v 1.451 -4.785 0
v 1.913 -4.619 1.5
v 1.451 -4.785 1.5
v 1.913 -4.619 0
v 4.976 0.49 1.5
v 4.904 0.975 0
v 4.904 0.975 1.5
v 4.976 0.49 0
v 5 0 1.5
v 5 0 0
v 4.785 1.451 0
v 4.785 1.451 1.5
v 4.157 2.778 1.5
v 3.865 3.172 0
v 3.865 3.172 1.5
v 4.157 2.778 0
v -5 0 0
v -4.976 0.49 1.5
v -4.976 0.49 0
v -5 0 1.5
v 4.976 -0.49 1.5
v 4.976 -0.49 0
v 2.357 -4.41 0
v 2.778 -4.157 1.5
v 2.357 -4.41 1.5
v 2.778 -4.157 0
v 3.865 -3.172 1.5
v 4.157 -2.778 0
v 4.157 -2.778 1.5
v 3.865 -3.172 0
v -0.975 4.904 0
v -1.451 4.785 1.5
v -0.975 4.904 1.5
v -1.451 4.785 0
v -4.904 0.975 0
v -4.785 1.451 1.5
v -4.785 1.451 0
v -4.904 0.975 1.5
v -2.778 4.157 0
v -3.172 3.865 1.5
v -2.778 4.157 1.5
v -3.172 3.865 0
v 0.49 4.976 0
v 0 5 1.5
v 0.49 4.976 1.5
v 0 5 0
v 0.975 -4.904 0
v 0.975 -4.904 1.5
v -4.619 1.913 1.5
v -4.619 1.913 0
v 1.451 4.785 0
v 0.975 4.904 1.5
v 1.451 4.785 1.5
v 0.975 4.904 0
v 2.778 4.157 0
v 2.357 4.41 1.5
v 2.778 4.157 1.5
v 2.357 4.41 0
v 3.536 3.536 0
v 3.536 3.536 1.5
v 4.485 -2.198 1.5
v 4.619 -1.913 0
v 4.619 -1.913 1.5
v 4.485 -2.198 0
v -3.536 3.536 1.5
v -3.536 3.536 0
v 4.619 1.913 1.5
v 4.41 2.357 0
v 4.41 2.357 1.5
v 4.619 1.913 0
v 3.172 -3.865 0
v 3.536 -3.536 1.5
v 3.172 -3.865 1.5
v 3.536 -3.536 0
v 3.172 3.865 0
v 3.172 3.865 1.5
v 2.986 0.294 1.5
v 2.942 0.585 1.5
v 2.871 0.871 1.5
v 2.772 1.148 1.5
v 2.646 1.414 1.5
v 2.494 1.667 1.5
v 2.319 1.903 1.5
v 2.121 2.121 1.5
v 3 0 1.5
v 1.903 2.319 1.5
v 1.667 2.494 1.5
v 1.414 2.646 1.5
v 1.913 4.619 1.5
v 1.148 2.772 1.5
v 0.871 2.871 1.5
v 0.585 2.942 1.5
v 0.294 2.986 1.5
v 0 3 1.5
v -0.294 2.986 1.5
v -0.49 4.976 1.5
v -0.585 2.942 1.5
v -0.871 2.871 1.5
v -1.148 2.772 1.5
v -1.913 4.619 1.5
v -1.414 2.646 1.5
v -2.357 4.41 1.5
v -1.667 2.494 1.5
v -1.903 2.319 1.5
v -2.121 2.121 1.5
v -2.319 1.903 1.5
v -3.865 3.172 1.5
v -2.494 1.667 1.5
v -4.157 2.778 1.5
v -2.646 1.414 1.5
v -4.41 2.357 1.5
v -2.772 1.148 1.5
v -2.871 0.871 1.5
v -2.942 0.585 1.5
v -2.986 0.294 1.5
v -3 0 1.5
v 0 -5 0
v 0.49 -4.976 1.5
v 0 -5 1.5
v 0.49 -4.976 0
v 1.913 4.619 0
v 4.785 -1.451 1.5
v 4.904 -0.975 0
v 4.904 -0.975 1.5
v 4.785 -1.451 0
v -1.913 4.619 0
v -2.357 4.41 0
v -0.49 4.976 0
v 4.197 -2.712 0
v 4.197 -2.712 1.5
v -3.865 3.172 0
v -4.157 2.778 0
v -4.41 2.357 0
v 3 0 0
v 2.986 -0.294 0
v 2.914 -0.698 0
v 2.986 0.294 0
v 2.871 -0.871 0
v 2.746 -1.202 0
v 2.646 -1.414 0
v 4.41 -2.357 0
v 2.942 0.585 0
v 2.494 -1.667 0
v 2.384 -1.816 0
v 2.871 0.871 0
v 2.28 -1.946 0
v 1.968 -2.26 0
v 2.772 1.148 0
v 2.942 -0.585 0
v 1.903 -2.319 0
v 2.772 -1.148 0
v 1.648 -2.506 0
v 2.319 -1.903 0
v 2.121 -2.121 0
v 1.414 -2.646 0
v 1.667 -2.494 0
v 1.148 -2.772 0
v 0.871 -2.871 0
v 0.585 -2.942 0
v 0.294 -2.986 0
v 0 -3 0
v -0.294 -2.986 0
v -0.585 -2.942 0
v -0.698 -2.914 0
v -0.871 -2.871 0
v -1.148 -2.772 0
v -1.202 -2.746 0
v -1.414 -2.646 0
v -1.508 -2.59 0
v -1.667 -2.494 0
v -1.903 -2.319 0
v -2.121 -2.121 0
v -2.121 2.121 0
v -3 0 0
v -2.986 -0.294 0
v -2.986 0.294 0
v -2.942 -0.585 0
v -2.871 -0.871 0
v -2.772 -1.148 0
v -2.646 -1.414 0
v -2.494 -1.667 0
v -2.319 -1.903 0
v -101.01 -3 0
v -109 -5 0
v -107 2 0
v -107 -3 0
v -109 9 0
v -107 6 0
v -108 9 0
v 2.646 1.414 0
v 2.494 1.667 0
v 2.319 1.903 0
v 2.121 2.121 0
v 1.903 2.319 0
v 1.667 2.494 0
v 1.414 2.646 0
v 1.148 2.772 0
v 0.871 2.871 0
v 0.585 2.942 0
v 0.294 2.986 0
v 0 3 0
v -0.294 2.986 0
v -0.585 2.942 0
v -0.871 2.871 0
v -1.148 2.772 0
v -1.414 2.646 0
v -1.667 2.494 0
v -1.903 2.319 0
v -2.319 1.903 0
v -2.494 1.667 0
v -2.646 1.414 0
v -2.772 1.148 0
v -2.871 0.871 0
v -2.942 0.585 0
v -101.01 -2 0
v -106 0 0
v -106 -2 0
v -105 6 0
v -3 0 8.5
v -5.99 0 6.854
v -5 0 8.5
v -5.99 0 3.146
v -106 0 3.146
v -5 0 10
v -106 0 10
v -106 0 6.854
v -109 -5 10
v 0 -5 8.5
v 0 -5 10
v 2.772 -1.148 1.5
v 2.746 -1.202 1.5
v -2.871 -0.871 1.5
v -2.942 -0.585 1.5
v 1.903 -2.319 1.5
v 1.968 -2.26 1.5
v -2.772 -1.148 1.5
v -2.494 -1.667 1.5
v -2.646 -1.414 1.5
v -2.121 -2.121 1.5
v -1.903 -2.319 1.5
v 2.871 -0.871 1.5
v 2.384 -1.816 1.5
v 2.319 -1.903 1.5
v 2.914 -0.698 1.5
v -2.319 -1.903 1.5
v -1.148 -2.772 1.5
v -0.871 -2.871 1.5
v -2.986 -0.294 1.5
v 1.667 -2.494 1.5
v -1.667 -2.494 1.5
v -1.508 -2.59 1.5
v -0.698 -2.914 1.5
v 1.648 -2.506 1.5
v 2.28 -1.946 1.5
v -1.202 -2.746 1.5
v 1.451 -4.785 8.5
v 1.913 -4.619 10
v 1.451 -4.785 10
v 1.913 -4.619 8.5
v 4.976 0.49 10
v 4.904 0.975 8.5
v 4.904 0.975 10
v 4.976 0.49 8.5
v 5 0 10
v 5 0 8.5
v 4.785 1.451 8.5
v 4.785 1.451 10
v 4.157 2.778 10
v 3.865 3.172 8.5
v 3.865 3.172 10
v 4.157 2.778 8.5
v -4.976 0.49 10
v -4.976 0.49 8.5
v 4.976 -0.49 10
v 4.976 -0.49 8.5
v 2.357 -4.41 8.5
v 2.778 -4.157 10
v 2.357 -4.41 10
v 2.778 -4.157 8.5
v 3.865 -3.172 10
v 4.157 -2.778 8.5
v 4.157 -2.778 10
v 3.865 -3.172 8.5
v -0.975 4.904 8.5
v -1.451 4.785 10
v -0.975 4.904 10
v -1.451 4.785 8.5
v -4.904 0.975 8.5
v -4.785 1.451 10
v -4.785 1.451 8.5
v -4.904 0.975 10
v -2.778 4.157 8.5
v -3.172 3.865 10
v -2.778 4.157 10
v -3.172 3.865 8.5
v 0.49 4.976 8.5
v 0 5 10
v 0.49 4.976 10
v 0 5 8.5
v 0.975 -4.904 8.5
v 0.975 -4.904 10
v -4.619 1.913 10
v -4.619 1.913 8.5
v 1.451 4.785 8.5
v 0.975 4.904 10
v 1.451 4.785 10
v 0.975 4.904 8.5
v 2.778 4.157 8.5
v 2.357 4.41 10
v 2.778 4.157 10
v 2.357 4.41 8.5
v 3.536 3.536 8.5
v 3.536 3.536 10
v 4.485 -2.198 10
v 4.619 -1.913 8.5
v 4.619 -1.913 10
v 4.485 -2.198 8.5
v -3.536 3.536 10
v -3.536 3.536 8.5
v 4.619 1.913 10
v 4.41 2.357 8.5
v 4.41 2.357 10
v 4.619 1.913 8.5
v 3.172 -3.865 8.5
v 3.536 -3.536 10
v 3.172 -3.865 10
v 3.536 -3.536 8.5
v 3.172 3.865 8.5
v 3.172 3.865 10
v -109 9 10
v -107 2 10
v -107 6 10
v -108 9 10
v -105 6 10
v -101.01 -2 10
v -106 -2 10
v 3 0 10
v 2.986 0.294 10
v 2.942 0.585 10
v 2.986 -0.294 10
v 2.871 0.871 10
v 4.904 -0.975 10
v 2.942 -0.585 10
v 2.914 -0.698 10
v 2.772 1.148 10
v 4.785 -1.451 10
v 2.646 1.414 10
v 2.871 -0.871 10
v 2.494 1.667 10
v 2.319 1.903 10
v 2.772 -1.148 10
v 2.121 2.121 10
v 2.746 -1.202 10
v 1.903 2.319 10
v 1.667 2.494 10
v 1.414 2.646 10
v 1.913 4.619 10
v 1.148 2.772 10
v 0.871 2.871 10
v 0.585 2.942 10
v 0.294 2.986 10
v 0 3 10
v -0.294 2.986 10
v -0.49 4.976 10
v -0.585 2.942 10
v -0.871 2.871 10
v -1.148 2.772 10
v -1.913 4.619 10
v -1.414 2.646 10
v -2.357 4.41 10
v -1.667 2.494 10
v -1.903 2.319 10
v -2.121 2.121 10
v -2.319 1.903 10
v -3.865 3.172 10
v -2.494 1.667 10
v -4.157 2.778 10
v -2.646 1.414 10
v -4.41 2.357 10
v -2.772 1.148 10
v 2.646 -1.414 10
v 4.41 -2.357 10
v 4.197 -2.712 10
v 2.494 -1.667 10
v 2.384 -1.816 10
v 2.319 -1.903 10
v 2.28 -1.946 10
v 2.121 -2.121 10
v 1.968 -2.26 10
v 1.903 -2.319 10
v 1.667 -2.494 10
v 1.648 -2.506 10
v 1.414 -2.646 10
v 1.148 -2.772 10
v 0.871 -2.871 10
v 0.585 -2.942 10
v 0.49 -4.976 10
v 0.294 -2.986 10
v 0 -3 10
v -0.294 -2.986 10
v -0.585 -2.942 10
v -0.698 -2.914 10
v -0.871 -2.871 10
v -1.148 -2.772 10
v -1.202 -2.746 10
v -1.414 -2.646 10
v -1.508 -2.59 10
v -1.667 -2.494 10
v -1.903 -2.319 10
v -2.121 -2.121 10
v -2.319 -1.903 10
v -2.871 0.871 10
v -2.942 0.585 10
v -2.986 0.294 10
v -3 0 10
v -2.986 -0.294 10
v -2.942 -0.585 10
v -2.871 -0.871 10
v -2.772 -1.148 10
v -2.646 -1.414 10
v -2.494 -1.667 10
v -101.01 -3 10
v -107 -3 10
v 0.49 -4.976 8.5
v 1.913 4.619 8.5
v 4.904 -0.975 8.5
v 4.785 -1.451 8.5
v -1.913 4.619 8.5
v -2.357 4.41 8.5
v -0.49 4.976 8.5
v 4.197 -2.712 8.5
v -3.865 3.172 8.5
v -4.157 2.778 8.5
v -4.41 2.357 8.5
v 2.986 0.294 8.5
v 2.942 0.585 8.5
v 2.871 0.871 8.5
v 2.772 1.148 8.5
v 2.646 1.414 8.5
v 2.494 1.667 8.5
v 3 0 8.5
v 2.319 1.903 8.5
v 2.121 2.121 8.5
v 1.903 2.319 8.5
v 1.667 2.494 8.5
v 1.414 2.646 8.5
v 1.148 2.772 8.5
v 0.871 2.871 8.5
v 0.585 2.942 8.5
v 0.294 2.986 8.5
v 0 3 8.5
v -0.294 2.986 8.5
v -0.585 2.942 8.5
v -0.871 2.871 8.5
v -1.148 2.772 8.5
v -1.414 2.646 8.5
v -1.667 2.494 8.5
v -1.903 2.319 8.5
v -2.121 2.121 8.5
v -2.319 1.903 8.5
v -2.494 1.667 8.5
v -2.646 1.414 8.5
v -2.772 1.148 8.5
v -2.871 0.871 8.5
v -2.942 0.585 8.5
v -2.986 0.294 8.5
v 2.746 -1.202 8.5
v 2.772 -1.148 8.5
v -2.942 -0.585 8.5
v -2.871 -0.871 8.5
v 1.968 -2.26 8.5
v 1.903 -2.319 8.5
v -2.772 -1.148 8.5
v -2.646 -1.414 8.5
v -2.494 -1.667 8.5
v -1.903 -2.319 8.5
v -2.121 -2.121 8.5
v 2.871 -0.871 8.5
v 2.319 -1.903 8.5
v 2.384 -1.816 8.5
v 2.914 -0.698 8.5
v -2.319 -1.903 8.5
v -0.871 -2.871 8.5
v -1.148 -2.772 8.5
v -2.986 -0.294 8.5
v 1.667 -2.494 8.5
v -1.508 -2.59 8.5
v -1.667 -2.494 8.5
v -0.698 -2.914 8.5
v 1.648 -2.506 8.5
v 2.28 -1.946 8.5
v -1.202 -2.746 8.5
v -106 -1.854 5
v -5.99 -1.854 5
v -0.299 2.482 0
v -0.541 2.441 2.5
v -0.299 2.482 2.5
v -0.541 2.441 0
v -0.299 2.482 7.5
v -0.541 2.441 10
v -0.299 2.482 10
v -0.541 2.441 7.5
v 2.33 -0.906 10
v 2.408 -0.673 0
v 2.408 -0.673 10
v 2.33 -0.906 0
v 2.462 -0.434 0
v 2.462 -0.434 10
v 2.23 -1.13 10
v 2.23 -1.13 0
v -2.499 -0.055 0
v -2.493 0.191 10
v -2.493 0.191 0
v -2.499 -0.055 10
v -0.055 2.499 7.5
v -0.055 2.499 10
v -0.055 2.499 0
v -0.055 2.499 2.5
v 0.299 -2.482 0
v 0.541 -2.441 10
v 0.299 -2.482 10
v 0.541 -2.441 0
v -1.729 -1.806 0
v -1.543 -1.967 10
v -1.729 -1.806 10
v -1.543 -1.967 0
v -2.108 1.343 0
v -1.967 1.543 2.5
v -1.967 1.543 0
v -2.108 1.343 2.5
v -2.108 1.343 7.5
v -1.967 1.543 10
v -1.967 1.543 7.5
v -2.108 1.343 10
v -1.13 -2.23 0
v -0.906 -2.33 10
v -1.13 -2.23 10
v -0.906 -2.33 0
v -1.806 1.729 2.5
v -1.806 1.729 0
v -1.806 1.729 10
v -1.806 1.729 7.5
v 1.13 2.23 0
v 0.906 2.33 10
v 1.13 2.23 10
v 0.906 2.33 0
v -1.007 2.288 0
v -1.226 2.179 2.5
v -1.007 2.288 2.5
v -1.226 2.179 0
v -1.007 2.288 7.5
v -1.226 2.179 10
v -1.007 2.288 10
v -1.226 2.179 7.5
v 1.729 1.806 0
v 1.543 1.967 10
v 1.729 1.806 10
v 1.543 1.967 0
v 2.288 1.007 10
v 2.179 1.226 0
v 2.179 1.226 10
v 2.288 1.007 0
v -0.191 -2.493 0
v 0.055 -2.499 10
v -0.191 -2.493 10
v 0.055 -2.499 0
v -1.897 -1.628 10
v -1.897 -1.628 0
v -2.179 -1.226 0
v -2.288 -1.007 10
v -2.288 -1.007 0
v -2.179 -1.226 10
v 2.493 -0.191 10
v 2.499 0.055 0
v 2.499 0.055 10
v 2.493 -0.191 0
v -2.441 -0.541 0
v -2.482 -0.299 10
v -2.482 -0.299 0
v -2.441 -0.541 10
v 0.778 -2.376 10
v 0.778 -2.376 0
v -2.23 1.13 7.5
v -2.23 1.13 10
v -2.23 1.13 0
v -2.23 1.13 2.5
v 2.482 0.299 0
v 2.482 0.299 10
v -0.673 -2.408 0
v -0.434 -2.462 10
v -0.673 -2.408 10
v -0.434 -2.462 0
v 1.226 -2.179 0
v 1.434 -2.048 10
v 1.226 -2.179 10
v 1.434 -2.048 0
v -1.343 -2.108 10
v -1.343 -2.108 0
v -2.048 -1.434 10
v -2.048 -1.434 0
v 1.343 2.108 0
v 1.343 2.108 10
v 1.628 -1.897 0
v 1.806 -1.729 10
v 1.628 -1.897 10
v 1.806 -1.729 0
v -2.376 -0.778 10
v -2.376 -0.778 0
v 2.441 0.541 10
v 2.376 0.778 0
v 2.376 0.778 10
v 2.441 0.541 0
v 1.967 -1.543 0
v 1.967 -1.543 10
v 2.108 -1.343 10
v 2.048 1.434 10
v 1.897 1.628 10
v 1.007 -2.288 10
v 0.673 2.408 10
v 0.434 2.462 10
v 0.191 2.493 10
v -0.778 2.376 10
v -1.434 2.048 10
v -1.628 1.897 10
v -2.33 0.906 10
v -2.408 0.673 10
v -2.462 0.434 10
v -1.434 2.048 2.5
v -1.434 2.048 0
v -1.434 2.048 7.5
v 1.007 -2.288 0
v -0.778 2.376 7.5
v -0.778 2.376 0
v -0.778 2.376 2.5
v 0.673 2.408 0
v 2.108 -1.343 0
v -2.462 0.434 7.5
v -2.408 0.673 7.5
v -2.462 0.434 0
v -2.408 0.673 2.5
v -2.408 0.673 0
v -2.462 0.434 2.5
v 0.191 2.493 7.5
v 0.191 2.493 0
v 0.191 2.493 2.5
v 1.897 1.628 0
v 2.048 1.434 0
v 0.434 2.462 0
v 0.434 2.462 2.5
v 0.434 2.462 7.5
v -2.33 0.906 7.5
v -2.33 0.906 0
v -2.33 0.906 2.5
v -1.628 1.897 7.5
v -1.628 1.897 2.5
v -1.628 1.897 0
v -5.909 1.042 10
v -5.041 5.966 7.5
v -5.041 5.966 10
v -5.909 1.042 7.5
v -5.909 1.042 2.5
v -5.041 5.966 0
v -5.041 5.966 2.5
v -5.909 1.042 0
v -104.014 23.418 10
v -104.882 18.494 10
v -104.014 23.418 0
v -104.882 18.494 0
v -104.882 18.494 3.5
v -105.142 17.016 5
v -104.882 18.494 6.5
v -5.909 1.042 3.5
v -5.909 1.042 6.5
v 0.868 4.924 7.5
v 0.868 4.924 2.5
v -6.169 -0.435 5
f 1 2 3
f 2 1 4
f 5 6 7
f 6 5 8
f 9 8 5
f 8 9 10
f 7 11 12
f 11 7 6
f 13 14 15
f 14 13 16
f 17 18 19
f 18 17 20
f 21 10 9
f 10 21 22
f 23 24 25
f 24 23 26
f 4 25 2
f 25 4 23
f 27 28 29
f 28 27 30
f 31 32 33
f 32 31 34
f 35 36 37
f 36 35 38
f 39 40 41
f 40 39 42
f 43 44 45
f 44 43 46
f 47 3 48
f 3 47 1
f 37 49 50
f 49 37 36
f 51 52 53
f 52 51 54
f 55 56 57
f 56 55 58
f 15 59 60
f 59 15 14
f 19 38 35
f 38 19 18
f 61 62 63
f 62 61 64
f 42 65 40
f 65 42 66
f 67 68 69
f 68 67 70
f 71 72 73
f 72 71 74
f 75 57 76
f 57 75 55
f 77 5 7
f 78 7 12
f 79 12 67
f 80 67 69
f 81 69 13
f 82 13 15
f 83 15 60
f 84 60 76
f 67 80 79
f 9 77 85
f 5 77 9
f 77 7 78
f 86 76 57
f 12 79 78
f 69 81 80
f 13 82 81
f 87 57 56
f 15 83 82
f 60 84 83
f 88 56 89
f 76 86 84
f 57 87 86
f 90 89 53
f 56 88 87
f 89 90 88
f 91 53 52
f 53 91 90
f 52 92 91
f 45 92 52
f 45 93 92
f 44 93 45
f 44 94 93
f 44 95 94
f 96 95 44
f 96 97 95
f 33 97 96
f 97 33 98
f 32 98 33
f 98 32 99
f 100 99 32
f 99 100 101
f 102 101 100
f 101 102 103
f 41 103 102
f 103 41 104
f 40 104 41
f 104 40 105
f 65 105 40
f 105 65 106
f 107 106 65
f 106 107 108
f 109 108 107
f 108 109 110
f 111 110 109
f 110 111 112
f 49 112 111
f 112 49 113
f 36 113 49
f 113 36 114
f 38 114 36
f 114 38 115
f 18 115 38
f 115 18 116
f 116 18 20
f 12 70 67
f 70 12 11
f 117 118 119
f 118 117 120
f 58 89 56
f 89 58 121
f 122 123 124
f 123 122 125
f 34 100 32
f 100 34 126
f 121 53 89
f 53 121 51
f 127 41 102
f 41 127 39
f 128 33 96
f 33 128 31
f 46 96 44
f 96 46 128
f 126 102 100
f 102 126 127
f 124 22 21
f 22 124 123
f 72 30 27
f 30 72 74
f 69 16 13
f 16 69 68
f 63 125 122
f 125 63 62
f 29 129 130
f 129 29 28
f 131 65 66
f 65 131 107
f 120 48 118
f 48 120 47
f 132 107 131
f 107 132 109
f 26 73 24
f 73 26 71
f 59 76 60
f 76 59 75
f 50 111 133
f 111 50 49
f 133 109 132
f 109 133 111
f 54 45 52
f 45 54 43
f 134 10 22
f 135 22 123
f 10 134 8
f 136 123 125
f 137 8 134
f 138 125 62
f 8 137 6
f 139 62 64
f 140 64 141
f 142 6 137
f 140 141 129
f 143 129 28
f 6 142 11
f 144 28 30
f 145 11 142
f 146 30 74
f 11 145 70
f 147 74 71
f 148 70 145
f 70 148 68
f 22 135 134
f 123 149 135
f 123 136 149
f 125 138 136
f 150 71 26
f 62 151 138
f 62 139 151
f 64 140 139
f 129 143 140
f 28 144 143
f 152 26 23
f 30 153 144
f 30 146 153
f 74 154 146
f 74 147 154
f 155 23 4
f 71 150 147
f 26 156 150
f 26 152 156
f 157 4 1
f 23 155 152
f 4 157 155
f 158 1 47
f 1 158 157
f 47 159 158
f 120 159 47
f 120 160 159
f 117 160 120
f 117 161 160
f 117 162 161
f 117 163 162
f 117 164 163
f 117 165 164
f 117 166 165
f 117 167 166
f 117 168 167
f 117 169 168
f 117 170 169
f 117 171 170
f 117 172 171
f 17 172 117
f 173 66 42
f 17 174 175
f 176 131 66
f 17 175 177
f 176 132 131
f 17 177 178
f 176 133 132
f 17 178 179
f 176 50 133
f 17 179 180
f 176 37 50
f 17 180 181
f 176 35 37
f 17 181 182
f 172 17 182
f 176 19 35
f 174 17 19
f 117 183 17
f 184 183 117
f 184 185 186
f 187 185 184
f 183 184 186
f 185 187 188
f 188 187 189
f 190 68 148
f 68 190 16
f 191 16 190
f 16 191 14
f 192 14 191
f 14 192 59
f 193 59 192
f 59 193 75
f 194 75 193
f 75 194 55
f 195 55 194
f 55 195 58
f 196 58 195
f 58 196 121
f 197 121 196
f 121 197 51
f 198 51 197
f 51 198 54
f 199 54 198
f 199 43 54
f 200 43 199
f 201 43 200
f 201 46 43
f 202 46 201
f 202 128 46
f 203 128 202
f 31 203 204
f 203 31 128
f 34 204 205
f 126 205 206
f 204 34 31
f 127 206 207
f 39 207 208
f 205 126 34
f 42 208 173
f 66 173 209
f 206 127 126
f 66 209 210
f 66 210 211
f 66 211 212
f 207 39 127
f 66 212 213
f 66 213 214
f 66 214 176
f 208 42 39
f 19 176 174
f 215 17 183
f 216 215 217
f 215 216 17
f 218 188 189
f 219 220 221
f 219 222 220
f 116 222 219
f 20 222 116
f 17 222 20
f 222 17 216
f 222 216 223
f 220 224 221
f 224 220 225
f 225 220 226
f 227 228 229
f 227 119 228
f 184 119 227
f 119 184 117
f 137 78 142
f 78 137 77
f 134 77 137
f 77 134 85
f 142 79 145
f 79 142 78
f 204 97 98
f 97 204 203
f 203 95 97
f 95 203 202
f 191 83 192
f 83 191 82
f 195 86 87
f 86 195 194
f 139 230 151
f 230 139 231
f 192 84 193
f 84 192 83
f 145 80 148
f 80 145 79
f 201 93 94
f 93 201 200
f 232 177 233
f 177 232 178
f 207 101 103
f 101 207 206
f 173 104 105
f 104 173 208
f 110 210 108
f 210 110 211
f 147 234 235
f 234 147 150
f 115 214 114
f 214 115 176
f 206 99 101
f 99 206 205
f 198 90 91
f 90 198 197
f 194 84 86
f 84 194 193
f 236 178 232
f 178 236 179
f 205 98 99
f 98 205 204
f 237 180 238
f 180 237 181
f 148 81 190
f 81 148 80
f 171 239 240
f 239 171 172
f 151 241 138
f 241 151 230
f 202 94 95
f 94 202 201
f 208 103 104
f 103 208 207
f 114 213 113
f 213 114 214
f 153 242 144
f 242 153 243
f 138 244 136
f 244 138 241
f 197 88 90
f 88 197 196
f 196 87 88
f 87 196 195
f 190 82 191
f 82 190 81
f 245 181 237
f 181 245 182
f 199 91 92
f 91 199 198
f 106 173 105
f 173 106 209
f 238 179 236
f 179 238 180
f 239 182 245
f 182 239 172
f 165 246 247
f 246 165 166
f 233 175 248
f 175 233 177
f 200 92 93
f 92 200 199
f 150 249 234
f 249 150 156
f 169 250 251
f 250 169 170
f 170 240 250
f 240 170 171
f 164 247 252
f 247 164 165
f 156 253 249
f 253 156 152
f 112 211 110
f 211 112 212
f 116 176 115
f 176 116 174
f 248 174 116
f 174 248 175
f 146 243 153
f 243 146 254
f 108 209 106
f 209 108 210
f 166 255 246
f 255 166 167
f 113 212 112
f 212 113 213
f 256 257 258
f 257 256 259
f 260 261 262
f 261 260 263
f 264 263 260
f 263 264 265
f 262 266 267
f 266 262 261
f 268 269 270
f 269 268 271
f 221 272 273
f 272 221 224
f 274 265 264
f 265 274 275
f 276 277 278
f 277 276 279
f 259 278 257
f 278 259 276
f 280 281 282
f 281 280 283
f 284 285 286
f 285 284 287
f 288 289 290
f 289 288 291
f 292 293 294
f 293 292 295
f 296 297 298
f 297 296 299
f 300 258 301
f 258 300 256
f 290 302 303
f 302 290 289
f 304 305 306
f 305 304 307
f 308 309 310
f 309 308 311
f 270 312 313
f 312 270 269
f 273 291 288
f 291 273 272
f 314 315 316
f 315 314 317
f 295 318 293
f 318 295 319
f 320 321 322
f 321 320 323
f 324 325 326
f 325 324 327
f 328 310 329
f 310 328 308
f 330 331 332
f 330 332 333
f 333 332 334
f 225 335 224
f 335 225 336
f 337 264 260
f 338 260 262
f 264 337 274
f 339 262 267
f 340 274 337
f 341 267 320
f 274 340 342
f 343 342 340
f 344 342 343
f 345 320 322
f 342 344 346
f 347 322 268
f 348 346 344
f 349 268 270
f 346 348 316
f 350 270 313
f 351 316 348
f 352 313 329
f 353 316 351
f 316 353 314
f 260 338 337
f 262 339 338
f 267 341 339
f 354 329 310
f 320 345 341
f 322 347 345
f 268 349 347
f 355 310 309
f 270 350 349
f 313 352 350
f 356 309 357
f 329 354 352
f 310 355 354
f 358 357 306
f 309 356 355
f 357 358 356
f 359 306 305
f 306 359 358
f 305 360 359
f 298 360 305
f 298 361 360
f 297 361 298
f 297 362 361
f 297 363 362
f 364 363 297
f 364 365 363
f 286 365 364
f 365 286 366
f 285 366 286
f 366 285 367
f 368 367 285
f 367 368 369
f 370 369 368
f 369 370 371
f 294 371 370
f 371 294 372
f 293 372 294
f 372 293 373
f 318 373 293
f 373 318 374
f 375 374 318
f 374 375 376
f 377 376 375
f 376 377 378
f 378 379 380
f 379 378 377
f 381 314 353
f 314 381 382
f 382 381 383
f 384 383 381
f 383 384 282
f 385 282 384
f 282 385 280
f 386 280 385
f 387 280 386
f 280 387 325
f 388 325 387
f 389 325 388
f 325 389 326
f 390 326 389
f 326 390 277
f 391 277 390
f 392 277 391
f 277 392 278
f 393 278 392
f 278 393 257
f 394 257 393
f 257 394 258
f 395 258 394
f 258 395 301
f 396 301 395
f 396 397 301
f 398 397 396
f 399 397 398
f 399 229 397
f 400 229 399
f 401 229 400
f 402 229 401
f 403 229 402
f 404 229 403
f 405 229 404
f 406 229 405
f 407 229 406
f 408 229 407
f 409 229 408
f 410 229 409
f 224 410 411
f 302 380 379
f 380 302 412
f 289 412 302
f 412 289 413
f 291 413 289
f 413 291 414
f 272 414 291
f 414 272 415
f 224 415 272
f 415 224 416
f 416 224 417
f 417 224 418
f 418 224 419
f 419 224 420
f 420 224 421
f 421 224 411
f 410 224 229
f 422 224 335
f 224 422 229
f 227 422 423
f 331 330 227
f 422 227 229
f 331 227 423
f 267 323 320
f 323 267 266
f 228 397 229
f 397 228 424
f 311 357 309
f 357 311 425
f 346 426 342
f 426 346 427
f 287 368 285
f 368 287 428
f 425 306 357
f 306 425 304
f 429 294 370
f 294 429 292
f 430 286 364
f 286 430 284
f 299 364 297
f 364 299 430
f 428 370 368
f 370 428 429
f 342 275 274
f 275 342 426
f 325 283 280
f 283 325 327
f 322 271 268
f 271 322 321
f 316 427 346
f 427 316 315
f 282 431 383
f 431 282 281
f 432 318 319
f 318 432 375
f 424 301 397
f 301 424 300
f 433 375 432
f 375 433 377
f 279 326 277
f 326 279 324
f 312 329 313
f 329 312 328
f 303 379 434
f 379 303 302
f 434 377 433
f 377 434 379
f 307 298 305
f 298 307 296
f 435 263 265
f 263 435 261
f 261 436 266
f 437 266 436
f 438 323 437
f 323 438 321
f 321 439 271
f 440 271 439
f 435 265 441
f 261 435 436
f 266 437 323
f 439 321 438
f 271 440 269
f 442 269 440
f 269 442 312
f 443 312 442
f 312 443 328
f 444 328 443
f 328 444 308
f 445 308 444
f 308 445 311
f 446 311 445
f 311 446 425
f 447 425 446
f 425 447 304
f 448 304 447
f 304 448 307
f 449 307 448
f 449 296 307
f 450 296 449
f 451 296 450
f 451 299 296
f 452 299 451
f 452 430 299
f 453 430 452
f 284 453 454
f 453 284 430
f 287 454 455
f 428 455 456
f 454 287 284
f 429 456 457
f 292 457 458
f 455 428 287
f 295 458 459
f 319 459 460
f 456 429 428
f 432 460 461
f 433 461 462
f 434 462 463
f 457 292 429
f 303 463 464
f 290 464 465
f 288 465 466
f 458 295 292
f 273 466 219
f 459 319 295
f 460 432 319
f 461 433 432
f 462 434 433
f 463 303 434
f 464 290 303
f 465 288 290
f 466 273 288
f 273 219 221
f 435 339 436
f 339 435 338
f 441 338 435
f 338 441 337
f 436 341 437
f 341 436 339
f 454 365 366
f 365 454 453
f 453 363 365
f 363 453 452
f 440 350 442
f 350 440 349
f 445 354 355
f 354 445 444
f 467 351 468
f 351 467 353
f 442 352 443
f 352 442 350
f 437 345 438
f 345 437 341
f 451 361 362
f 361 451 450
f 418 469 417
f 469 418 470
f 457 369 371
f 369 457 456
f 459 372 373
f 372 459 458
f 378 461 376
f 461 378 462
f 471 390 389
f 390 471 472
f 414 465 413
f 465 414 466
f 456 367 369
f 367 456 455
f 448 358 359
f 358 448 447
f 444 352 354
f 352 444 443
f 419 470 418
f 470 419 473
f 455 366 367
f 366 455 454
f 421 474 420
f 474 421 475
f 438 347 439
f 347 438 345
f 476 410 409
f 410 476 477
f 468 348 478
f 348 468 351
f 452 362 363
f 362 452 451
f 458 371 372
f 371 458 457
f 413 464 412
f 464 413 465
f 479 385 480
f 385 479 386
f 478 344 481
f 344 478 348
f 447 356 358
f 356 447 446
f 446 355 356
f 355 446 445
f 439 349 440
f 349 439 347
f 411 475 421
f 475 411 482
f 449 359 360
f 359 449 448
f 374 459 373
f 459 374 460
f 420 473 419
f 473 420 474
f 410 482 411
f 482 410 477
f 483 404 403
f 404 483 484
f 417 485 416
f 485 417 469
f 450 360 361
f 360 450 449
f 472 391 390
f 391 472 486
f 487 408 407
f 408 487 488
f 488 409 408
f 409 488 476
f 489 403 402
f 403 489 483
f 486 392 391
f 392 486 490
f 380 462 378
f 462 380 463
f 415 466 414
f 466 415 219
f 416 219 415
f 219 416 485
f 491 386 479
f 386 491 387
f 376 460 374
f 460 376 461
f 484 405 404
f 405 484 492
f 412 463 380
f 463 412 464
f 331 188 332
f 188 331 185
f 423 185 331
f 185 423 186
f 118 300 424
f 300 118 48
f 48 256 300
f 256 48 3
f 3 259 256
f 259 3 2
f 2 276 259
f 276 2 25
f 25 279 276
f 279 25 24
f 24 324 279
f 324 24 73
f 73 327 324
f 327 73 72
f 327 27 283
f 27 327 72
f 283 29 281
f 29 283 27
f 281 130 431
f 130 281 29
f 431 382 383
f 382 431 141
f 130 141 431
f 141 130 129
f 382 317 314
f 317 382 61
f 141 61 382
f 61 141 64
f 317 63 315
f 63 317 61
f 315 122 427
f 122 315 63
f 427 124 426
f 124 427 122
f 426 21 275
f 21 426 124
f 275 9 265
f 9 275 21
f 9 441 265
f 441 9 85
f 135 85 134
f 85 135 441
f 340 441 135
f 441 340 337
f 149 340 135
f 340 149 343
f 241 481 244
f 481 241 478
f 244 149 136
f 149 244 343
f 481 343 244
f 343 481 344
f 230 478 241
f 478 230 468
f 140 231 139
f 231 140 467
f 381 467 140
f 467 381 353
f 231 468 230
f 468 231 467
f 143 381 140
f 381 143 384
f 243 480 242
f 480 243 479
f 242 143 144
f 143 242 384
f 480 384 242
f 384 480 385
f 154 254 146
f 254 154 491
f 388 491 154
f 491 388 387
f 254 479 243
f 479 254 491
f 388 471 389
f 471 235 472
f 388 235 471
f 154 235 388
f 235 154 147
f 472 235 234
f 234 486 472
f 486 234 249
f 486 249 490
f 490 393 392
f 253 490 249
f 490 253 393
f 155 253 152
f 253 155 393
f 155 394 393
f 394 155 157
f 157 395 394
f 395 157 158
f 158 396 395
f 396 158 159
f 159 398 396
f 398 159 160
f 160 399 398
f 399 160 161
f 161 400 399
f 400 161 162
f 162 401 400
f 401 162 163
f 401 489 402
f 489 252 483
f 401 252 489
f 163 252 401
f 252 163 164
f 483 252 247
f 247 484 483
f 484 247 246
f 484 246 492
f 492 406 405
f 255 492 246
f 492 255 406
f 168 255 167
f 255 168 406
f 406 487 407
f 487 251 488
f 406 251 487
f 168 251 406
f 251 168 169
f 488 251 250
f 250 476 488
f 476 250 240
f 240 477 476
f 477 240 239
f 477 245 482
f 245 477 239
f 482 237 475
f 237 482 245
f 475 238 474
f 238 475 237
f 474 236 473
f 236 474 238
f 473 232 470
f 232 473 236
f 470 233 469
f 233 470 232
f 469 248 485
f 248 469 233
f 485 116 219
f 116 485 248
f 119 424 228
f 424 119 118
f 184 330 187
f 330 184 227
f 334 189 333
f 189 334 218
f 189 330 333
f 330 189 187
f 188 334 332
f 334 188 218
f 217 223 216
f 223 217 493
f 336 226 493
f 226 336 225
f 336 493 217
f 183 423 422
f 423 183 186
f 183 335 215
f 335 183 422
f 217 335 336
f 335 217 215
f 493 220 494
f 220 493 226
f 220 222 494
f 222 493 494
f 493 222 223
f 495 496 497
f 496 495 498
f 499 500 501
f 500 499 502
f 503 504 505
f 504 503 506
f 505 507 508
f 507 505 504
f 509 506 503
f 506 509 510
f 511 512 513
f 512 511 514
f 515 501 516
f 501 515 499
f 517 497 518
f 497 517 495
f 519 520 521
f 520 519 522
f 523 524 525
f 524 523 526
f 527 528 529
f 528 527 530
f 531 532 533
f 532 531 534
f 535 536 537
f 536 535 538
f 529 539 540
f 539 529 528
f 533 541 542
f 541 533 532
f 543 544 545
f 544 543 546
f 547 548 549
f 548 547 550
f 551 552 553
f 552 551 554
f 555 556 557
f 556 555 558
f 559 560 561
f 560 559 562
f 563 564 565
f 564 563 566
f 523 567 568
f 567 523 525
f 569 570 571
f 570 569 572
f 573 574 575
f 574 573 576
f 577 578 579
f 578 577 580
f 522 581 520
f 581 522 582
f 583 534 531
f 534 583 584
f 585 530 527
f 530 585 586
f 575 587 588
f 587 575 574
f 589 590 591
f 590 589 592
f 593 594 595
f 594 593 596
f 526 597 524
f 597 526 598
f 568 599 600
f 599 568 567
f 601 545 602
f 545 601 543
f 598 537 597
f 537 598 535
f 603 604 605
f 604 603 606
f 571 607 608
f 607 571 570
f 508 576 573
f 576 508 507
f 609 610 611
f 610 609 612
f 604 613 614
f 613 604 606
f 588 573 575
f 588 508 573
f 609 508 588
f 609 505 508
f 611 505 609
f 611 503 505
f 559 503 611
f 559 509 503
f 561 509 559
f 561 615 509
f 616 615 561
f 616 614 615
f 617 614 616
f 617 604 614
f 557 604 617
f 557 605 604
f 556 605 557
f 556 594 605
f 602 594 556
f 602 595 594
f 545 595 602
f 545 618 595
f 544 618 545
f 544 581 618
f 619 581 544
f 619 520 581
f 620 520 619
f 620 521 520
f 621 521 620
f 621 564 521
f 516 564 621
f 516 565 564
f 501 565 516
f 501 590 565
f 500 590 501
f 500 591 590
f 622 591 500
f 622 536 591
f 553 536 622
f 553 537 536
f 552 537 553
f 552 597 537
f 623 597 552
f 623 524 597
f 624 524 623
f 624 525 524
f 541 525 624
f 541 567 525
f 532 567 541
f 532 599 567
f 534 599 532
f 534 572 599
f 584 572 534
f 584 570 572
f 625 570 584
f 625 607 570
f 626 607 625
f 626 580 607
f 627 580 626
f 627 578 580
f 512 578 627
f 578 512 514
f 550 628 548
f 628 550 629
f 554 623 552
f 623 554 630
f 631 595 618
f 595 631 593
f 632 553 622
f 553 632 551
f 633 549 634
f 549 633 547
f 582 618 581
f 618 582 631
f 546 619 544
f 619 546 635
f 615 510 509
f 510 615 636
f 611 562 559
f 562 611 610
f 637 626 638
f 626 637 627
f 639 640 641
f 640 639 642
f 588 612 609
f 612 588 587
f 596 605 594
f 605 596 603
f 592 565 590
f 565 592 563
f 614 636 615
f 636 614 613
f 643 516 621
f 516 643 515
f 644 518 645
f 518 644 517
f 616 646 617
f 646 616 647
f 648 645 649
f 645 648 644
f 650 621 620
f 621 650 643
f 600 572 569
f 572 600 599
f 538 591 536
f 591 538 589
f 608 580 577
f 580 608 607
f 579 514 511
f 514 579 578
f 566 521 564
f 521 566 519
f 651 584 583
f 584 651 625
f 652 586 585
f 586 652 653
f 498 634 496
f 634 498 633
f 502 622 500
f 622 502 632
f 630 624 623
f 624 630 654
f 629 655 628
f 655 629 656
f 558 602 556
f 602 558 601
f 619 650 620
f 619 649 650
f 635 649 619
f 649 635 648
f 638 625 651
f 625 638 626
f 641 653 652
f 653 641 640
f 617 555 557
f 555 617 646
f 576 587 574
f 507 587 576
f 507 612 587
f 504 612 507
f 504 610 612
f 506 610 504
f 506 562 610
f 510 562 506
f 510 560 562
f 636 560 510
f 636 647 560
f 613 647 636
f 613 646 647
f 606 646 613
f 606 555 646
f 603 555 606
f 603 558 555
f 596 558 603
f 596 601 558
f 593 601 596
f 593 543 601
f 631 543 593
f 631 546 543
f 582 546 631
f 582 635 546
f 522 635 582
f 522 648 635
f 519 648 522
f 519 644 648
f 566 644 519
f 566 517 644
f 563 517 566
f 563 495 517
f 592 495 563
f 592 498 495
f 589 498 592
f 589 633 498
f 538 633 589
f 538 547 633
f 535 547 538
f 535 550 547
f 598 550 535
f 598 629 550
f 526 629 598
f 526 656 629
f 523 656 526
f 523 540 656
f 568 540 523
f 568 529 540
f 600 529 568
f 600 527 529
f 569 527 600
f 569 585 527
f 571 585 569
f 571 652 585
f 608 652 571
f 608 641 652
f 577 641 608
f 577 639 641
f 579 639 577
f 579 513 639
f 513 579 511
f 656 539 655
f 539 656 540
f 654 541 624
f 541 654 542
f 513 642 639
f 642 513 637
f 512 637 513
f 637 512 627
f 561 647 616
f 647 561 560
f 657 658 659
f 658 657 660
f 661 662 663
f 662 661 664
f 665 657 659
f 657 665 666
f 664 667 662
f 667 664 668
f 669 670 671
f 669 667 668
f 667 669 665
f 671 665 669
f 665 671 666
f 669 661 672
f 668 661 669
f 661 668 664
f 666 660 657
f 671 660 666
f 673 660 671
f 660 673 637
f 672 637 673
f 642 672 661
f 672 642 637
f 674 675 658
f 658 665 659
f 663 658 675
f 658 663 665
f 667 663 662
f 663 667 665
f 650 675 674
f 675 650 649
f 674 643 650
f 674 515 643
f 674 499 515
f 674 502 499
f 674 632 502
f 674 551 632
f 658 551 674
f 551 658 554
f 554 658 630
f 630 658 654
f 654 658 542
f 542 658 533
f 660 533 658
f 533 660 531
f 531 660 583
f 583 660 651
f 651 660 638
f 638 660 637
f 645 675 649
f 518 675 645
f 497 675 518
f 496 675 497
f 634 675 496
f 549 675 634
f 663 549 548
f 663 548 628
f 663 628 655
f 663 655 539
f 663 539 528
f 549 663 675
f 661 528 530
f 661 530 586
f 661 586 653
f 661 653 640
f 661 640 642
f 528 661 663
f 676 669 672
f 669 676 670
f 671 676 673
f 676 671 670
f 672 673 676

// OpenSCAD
// Parametric Bag Clip - PLA compatible
// https://www.thingiverse.com/thing:3388572
// by Bikecyclist
// https://www.thingiverse.com/Bikecyclist
//
// Remixed from Bag Clip - PLA compatible
// https://www.thingiverse.com/thing:330151
// by MasterFX
// https://www.thingiverse.com/MasterFX


// Effective clip length - clamp bags of this width.
l_clip = 100;

// Width of clip (per arm)
w_clip = 5;

// Height of clip
h_clip = 10;

// Thickness of the hook
th_hook = 2;

// Thickness of the ridge
th_ridge = 1.5;

// Tolerance between parts
tol = 1;

// Opening angle for print (must be < 90 or parts will fuse)
alpha = 10;

/* [Hidden] */

// Number of facets
$fn = 64;

// Small distance to ensure proper meshing
eps = 0.01;


translate ([-(l_clip/2 + w_clip + tol), -w_clip/2, 0])
difference ()
{
    union ()
    {
        //Clip Body
        translate ([-tol/2, 0, 0])
        ccube ([l_clip + tol, w_clip, h_clip]);

        //Axle to Body Connection
        eye ();
        
        linear_extrude (h_clip, convexity = 10)
        projection (cut = false)
        intersection ()
        {
            eye ();
            
            translate ([2 * w_clip + tol + eps, 0, 0])
            ccube ([l_clip, w_clip, h_clip]);
        }
        
        //Hook Body
        translate ([-l_clip/2 - th_hook/2 - tol, (w_clip + th_hook + tol)/2, 0])
        ccube ([th_hook, 2 * w_clip + th_hook + tol, h_clip]);

        //Hook Barb
        translate ([-l_clip/2 - th_hook/2 - tol, 3/2 * w_clip + th_hook, 0])
        linear_extrude (h_clip)
        polygon 
        ([
            [0, th_hook/2 + tol],
            [3/2*th_hook, -tol],
            [-th_hook/2, -tol],
            [-th_hook/2, th_hook/2 + tol],
        ]);
    }
    
    //Hook Gap
    translate ([-l_clip/2 - tol/2, th_hook, -eps])
    ccube ([tol, w_clip, h_clip + 2 * eps]);
    
    //Flexibility Cut
    translate ([-(l_clip + tol)/2 + w_clip/2 + tol/2 - eps, -w_clip/2 + th_hook + tol/2, -eps])
    ccube ([w_clip, tol, h_clip + 2 * eps]);
    
    //Ridge Recess
    translate ([0, w_clip/2, h_clip/2])
    rotate ([45, 0, 0])
    cube ([l_clip + 2 * eps, sqrt(2) * th_ridge + tol/2, sqrt(2) * th_ridge + tol/2], center = true);
}

rotate ([0, 0, -alpha])
translate ([-(l_clip/2 + w_clip) - tol, -w_clip/2, 0])
translate ([0, w_clip, 0])
mirror ([0, 1, 0])
{
    //Axle
    translate ([l_clip/2 + w_clip + tol, 1/2 * w_clip, 0])
    cylinder (d = w_clip, h = h_clip);

    //Clip Body
    translate ([-tol/4, 0, 0])
    ccube ([l_clip + tol/2, w_clip, h_clip]);
    
    //Axle to Body Connection
    translate ([w_clip/2 + tol, 0, h_clip/2])
    cube ([l_clip + w_clip, w_clip, h_clip/2], center = true);
    
    //Ridge
    translate ([-tol/4, w_clip/2, h_clip/2])
    rotate ([45, 0, 0])
    cube ([l_clip + tol/2, sqrt(2) * th_ridge, sqrt(2) * th_ridge], center = true);

}

module eye ()
{
    for (i = [-1, 1])
    translate ([w_clip + tol, 0, h_clip/2 - (h_clip/4 - tol)/2 + i * (h_clip/2 - (h_clip/4 - tol)/2)])
    difference ()
    {
        union ()
        {
            translate ([l_clip/2, w_clip/2, 0])
            cylinder (d = 2 * w_clip, h = h_clip/4 - tol);
            
            ccube ([l_clip, w_clip, h_clip/4 - tol]);
        }
        
        translate ([l_clip/2, w_clip/2, 0])
        translate ([0, 0, -eps])
        cylinder (d = w_clip + tol, h = h_clip + 2 * eps);
    }

}

module ccube (dim)
{
    translate ([0, 0, dim [2]/2])
    cube ([dim [0], dim [1], dim [2]], center = true);
}
